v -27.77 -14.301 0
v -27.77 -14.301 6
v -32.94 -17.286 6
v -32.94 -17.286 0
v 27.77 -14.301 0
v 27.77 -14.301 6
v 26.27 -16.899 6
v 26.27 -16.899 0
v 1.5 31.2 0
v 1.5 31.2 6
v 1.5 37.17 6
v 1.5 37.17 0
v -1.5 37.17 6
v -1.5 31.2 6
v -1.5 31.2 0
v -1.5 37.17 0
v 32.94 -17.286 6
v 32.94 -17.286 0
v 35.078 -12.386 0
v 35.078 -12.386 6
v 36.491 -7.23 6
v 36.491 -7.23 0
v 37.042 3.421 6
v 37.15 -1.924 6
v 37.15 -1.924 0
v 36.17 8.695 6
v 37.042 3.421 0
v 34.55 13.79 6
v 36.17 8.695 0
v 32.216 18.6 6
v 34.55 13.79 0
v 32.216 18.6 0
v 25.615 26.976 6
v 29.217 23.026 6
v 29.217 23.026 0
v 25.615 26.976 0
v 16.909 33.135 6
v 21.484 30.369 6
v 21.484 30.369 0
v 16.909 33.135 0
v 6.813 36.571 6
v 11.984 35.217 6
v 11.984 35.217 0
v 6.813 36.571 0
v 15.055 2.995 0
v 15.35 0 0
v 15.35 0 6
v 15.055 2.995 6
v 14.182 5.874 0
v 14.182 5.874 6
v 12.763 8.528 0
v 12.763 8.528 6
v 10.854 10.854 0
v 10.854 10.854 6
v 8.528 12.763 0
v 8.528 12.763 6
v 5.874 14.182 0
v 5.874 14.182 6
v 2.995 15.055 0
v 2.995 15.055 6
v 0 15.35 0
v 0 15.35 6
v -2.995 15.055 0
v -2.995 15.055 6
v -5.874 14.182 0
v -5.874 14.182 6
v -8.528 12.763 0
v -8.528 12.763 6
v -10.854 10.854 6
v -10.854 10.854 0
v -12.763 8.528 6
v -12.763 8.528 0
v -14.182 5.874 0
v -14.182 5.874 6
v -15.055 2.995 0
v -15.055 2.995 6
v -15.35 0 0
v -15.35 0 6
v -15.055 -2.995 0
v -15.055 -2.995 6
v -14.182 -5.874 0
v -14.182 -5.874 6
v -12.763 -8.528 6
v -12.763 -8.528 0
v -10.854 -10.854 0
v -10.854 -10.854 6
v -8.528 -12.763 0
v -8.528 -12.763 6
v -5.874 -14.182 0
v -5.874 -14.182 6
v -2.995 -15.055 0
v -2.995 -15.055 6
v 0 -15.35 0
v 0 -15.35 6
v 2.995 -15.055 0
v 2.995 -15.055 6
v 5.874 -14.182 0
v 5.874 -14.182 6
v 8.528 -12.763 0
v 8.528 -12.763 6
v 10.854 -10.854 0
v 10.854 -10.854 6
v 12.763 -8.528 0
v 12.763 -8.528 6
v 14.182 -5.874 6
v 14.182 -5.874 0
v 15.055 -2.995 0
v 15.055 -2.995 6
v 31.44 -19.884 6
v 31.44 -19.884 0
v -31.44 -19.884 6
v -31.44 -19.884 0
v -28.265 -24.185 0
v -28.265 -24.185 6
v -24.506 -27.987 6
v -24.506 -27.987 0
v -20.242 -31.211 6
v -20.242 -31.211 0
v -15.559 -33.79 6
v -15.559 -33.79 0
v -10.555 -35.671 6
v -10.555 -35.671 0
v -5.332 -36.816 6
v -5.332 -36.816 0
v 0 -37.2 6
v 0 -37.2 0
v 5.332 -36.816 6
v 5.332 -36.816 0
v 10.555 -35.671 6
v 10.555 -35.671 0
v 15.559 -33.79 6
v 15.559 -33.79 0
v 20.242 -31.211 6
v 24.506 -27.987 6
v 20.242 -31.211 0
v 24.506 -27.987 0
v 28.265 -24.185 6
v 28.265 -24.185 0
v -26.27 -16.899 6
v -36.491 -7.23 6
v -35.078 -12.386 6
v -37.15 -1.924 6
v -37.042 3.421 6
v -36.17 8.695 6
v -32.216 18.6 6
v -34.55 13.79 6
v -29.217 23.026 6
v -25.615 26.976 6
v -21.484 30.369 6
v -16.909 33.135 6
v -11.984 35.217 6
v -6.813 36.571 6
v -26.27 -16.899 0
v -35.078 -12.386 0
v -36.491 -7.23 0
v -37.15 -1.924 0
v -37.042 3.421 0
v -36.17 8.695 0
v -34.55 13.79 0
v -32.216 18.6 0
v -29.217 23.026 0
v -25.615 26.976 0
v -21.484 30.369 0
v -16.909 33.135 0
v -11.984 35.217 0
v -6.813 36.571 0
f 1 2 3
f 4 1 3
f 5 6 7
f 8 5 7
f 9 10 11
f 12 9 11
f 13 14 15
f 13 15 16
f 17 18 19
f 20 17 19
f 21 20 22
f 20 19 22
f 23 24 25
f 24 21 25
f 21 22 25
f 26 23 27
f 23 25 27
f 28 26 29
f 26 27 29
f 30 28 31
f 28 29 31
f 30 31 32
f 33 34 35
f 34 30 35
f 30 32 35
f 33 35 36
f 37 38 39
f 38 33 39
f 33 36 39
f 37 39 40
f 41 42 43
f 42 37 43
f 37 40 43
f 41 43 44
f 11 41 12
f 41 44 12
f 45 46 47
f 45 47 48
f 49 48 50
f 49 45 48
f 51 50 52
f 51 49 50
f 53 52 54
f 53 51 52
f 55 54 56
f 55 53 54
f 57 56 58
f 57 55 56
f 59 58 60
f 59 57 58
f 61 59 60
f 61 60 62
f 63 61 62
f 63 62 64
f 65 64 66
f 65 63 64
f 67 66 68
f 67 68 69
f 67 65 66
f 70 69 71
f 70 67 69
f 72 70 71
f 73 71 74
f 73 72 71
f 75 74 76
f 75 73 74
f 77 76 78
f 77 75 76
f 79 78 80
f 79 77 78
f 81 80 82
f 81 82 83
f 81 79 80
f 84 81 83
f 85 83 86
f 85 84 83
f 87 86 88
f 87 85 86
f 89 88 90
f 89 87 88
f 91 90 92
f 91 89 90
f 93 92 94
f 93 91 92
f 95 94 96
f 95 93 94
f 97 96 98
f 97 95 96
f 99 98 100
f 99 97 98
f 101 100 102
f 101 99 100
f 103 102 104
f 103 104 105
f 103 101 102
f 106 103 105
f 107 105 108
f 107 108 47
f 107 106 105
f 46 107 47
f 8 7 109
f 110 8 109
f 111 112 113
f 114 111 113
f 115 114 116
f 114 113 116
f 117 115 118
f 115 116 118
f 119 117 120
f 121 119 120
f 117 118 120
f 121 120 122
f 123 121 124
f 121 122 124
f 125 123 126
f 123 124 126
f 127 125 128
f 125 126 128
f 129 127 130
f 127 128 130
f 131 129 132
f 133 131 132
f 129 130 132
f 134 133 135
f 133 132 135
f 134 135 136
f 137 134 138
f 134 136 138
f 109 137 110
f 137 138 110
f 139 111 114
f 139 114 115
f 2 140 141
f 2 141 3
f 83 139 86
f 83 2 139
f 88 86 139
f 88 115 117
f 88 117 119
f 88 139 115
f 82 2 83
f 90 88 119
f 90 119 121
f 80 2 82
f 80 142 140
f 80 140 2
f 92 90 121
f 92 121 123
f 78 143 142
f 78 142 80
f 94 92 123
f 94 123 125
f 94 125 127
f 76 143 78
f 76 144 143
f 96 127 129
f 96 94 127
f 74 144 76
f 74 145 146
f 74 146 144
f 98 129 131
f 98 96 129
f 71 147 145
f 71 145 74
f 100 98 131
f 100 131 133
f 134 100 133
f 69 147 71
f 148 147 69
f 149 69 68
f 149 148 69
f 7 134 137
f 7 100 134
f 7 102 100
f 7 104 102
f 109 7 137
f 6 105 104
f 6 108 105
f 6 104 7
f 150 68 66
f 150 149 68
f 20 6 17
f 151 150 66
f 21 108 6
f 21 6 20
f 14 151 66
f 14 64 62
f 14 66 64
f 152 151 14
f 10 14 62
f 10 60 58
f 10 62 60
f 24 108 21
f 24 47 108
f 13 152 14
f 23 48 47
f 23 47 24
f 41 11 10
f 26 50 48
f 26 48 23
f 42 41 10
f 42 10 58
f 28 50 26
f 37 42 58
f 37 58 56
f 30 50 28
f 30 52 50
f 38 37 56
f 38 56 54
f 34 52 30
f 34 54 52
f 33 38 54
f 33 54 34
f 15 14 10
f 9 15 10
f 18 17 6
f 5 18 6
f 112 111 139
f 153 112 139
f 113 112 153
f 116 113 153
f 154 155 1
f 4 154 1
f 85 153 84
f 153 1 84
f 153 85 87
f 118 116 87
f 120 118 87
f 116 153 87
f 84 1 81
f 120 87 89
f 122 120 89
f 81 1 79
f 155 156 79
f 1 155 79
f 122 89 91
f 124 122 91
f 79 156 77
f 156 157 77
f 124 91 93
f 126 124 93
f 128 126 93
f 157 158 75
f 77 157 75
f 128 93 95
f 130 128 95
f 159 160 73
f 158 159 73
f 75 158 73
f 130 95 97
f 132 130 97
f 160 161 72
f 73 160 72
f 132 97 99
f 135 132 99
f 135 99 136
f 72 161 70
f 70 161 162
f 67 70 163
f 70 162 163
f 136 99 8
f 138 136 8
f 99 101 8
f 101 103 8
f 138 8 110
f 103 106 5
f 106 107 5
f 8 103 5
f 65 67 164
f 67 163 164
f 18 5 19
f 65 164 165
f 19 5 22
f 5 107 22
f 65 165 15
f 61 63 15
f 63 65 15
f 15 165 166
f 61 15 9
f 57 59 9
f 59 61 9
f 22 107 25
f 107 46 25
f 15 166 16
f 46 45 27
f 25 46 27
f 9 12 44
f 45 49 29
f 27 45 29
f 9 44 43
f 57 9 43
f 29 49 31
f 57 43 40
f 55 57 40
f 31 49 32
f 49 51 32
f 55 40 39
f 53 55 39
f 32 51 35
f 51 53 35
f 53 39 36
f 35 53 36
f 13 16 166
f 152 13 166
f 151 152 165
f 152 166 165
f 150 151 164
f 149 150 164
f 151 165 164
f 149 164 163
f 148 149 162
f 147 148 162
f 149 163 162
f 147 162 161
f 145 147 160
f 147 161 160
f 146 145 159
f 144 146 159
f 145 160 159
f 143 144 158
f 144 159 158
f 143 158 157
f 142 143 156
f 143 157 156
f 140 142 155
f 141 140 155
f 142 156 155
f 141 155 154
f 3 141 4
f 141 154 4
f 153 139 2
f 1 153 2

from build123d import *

# Parameters (mm, degrees)
SKETCH2_R           = 37.2
SKETCH2_R_2         = 15.35
BOSS_EXTRUDE1_DEPTH = 6
SKETCH3_W           = 3
SKETCH3_H           = 6
CUT_EXTRUDE1_DEPTH  = 6


with BuildPart() as part:
    # Sketch2 → Boss-Extrude1 (new body)
    with BuildSketch(Plane.XY):
        Circle(SKETCH2_R)
        Circle(SKETCH2_R_2, mode=Mode.SUBTRACT)
    extrude(amount=BOSS_EXTRUDE1_DEPTH)

    # Sketch3 → Cut-Extrude1 (cut)
    with BuildSketch(Plane.XY.offset(6)):
        with Locations((0, 34.2)):
            Rectangle(SKETCH3_W, SKETCH3_H)
        Polygon((26.269992598, -16.899038106), (31.466145021, -19.899038106), (32.966145021, -17.300961894), (27.769992598, -14.300961894), align=None)
        Polygon((-27.769992598, -14.300961894), (-32.966145021, -17.300961894), (-31.466145021, -19.899038106), (-26.269992598, -16.899038106), align=None)
    extrude(amount=-CUT_EXTRUDE1_DEPTH, mode=Mode.SUBTRACT)


solid = part.part
